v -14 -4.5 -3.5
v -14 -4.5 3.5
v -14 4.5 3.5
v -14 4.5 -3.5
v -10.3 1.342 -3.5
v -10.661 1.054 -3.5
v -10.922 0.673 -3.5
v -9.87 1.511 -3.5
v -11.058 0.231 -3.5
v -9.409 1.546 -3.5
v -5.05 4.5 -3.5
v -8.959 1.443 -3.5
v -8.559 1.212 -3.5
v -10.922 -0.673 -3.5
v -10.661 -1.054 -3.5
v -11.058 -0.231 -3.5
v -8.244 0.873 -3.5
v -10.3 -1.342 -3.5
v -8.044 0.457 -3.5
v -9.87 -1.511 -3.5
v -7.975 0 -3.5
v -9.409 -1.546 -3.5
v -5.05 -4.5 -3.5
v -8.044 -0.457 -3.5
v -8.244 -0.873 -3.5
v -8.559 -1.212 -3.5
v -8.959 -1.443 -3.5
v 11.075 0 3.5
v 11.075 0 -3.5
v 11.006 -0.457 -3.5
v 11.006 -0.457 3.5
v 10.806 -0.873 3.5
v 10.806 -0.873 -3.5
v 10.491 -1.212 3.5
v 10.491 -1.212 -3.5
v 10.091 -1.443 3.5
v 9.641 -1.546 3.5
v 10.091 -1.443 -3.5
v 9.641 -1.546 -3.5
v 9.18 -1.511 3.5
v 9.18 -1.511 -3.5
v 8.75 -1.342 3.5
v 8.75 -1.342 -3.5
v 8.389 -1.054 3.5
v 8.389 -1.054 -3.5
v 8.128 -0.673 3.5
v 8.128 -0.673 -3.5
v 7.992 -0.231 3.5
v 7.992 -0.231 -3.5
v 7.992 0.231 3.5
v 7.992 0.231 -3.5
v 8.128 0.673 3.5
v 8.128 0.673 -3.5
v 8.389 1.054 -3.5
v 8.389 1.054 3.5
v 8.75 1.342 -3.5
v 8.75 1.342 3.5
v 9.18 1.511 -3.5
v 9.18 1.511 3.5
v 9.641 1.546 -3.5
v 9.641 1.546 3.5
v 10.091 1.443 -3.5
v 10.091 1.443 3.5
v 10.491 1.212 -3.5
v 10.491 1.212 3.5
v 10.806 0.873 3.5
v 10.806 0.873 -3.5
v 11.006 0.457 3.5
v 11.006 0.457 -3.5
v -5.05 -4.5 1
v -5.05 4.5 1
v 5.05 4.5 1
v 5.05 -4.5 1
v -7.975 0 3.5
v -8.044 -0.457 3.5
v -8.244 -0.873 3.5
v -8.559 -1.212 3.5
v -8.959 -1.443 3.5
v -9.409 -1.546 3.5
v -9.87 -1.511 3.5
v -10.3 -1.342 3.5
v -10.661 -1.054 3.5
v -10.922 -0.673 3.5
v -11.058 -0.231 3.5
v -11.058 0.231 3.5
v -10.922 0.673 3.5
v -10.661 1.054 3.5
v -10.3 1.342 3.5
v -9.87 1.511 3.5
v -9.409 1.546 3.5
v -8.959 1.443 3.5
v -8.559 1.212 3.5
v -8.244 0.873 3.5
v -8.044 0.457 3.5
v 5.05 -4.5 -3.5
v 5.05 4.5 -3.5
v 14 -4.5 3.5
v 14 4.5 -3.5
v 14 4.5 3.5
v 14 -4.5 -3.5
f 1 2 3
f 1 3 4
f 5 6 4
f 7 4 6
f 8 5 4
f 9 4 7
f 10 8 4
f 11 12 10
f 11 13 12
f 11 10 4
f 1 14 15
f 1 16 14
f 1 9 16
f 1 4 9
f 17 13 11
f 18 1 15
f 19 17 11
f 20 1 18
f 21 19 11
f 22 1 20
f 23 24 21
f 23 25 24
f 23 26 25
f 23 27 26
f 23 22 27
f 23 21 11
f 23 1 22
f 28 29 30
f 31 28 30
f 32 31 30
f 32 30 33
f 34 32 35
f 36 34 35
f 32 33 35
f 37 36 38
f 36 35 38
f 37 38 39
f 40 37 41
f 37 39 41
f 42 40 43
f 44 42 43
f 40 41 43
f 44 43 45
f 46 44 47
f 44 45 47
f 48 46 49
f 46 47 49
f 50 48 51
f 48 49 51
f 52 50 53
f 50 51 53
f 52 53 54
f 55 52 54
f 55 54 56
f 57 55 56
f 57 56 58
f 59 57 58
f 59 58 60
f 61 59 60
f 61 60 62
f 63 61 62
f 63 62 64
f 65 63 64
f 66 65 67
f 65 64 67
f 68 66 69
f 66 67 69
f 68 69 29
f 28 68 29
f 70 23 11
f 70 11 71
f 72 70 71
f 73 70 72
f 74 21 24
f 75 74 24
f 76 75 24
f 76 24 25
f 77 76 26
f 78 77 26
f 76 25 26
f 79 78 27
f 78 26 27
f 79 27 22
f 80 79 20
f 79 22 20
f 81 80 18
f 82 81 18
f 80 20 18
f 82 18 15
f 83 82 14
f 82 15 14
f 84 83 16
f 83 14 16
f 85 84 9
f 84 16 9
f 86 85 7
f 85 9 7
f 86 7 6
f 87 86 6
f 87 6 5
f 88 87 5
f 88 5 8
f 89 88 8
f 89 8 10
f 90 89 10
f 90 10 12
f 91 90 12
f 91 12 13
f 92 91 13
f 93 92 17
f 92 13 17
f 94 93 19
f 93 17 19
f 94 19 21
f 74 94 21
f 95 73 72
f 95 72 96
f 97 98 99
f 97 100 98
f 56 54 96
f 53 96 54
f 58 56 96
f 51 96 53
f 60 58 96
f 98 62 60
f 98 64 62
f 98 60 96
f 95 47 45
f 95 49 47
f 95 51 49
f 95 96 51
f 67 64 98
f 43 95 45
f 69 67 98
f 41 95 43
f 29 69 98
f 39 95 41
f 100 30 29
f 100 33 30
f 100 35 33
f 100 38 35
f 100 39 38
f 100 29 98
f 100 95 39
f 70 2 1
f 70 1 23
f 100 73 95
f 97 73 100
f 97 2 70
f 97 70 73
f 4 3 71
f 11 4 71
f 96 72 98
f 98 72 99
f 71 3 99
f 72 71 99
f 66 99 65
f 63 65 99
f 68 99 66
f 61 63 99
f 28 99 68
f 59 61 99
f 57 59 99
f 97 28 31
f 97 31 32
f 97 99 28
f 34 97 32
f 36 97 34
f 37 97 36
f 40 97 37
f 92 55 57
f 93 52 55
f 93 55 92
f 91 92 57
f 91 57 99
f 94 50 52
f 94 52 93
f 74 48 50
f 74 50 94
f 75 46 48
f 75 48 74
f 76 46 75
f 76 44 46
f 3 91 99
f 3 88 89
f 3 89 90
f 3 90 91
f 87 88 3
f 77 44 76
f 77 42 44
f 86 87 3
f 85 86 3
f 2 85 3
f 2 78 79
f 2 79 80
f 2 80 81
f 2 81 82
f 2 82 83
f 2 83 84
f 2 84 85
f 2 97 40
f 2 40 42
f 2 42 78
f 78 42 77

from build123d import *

# Parameters (mm, degrees)
F1_DEPTH = 4.5
F2_R     = 1.55
F3_DEPTH = 7


with BuildPart() as f1:
    # F0 (on Front) → F1 (new body, symmetric)
    with BuildSketch(Plane.XZ):
        Polygon((14, 3.5), (0, 3.5), (-14, 3.5), (-14, -3.5), (-5.05, -3.5), (-5.05, 1), (0, 1), (5.05, 1), (5.05, -3.5), (14, -3.5), align=None)
    extrude(amount=F1_DEPTH, both=True)

    # F2 (on face) → F3 (cut, through all)
    with BuildSketch(Plane(origin=(0, 0, -3.5), x_dir=(1, 0, 0), z_dir=(0, 0, -1))):
        with Locations((9.525, 0)):
            Circle(F2_R)
        with Locations((-9.525, 0)):
            Circle(F2_R)
    extrude(amount=-F3_DEPTH, mode=Mode.SUBTRACT)


solid = f1.part
